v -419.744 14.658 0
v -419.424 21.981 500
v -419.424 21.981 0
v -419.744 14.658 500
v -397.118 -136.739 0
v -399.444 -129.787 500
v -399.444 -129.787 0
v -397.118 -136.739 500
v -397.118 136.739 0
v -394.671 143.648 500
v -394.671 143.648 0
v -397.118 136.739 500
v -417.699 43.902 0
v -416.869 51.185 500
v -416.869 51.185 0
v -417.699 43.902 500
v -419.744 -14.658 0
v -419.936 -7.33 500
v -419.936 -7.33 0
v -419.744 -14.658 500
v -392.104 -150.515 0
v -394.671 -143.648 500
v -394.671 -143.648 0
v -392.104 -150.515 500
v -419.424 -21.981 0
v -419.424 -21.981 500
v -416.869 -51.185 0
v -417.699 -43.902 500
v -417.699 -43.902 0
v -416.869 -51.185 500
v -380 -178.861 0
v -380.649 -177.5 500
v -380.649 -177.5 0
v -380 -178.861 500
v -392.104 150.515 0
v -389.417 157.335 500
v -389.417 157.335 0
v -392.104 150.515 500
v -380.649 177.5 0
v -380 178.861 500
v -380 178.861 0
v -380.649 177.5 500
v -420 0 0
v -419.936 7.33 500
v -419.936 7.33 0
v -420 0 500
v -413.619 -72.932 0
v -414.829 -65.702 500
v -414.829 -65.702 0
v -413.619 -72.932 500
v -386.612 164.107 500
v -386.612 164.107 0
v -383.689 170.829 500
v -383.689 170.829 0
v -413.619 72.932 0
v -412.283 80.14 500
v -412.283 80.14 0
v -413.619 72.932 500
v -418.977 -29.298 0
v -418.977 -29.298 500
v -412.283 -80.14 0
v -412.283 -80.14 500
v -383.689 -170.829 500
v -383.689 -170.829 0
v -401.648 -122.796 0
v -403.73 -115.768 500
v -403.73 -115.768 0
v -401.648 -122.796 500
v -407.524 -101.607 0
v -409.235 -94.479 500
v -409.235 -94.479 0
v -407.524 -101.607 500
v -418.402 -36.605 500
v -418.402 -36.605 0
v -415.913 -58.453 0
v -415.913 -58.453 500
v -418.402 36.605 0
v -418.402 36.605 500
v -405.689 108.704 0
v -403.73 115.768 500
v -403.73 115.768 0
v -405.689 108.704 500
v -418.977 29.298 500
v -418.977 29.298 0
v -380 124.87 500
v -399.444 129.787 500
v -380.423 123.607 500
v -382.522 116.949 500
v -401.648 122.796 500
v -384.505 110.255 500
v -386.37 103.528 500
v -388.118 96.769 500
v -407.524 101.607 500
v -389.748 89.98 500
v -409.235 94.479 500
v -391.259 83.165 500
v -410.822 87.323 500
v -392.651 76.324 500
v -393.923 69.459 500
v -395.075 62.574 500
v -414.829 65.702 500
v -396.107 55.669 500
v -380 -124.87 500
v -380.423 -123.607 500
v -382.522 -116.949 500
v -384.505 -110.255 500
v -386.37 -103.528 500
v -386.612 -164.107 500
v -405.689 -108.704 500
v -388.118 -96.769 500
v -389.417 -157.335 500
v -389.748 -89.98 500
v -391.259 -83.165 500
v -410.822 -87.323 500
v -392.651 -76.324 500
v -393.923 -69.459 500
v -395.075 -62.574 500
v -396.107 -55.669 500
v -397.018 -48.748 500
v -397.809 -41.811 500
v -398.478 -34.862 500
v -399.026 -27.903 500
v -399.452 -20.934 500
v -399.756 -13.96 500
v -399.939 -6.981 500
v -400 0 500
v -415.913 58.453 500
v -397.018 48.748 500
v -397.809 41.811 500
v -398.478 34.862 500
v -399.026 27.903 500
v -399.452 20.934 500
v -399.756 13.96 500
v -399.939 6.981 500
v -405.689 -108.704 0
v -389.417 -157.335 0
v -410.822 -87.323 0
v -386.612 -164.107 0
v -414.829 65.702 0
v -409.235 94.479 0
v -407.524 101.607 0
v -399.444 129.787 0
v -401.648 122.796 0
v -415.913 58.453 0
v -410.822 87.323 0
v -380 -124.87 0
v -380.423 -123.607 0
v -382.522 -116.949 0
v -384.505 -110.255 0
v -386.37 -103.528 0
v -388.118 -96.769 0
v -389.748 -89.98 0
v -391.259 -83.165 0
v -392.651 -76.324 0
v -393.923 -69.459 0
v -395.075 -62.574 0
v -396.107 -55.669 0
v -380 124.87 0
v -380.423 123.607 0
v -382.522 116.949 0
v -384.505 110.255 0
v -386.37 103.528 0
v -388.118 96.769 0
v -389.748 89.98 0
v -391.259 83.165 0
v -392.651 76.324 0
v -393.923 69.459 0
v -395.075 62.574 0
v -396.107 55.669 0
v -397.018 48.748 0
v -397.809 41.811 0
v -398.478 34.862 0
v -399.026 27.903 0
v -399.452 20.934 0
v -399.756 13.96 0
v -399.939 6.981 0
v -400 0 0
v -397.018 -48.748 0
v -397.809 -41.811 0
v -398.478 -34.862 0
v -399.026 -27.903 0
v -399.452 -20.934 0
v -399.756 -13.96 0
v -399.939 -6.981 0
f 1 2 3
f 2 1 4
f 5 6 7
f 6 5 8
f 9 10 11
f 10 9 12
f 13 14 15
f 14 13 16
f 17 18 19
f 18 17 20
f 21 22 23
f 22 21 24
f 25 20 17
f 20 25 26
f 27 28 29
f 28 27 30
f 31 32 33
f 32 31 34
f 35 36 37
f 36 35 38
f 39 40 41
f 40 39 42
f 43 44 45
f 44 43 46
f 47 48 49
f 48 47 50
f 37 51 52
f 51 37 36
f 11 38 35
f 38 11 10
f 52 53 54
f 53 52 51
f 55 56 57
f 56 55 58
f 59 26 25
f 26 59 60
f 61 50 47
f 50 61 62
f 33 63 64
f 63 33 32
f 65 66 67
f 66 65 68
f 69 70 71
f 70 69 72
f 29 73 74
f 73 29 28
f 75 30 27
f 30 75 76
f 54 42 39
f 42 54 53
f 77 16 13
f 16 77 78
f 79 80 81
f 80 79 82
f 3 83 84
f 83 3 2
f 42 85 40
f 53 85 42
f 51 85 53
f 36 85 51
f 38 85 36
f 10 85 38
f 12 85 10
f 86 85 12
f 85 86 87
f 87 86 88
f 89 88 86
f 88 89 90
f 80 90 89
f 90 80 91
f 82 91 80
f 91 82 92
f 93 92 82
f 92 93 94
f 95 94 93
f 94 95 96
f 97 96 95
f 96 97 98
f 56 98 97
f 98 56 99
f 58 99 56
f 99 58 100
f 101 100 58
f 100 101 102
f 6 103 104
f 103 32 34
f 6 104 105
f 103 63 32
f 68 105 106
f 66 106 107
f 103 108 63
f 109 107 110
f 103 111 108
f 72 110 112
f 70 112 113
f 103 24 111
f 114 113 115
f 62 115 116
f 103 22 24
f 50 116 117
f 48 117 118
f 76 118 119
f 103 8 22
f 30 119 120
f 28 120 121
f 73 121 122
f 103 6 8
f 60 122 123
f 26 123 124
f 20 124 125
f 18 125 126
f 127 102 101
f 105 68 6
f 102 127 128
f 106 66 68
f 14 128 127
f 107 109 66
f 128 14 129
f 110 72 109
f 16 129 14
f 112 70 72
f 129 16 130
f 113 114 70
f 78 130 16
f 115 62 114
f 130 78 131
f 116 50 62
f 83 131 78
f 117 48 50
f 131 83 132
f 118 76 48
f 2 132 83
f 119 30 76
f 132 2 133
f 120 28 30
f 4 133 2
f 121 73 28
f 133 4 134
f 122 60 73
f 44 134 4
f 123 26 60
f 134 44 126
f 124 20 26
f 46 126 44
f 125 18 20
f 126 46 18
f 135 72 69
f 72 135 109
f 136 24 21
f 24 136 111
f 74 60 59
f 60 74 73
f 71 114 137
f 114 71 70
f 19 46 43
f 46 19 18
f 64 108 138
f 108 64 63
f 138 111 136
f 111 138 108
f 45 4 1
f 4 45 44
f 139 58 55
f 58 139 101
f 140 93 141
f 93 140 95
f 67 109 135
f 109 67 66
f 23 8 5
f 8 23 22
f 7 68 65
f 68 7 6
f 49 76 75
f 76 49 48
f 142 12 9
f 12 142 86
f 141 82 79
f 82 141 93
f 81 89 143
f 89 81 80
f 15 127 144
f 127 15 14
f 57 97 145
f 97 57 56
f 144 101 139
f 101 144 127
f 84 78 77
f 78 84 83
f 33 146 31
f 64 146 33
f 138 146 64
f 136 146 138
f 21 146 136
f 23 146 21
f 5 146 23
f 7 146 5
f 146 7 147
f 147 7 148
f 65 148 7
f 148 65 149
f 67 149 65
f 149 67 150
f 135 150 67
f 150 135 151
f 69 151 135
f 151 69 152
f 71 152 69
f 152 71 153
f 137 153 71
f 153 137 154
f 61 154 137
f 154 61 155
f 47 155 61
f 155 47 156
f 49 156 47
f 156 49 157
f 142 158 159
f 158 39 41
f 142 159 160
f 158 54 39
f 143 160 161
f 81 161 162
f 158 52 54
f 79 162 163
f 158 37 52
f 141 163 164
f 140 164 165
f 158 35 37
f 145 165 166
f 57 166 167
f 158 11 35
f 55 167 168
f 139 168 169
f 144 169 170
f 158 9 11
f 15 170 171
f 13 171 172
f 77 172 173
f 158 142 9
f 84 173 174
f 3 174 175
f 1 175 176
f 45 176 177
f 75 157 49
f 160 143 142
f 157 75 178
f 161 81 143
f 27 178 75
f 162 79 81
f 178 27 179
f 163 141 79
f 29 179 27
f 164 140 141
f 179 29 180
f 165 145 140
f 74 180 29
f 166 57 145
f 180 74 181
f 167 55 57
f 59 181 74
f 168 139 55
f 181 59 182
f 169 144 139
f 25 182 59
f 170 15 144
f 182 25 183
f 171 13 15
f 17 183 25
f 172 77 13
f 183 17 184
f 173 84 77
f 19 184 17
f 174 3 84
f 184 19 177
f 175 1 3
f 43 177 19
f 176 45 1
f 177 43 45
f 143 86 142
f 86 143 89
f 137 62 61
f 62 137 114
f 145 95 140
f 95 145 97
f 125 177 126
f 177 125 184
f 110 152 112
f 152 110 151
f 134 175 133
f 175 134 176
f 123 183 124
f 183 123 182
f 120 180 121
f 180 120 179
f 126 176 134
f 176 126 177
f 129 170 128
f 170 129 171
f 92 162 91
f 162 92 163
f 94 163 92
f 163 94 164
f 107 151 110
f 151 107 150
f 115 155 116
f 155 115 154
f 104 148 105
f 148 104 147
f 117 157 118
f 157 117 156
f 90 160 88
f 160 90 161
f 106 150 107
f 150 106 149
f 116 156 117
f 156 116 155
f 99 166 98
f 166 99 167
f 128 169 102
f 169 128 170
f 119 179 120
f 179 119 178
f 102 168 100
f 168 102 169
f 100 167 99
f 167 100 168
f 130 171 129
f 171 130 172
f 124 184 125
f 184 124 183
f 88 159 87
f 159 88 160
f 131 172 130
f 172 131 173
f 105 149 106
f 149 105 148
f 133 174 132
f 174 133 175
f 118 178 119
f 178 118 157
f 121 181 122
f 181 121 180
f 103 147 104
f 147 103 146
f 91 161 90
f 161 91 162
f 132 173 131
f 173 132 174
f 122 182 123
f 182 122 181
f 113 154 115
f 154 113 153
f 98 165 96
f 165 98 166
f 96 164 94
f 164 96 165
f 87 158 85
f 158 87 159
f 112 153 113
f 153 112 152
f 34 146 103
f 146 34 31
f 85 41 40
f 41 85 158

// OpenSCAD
// snow shovel
$fn=360;
difference() {
    difference() {
        cylinder(r=420, h=500);
        translate([0, 0, -5])
        cylinder(r=400, h=510);
    }

    translate([-380, -500, -5])
    cube([1000, 1000, 510]);
}
